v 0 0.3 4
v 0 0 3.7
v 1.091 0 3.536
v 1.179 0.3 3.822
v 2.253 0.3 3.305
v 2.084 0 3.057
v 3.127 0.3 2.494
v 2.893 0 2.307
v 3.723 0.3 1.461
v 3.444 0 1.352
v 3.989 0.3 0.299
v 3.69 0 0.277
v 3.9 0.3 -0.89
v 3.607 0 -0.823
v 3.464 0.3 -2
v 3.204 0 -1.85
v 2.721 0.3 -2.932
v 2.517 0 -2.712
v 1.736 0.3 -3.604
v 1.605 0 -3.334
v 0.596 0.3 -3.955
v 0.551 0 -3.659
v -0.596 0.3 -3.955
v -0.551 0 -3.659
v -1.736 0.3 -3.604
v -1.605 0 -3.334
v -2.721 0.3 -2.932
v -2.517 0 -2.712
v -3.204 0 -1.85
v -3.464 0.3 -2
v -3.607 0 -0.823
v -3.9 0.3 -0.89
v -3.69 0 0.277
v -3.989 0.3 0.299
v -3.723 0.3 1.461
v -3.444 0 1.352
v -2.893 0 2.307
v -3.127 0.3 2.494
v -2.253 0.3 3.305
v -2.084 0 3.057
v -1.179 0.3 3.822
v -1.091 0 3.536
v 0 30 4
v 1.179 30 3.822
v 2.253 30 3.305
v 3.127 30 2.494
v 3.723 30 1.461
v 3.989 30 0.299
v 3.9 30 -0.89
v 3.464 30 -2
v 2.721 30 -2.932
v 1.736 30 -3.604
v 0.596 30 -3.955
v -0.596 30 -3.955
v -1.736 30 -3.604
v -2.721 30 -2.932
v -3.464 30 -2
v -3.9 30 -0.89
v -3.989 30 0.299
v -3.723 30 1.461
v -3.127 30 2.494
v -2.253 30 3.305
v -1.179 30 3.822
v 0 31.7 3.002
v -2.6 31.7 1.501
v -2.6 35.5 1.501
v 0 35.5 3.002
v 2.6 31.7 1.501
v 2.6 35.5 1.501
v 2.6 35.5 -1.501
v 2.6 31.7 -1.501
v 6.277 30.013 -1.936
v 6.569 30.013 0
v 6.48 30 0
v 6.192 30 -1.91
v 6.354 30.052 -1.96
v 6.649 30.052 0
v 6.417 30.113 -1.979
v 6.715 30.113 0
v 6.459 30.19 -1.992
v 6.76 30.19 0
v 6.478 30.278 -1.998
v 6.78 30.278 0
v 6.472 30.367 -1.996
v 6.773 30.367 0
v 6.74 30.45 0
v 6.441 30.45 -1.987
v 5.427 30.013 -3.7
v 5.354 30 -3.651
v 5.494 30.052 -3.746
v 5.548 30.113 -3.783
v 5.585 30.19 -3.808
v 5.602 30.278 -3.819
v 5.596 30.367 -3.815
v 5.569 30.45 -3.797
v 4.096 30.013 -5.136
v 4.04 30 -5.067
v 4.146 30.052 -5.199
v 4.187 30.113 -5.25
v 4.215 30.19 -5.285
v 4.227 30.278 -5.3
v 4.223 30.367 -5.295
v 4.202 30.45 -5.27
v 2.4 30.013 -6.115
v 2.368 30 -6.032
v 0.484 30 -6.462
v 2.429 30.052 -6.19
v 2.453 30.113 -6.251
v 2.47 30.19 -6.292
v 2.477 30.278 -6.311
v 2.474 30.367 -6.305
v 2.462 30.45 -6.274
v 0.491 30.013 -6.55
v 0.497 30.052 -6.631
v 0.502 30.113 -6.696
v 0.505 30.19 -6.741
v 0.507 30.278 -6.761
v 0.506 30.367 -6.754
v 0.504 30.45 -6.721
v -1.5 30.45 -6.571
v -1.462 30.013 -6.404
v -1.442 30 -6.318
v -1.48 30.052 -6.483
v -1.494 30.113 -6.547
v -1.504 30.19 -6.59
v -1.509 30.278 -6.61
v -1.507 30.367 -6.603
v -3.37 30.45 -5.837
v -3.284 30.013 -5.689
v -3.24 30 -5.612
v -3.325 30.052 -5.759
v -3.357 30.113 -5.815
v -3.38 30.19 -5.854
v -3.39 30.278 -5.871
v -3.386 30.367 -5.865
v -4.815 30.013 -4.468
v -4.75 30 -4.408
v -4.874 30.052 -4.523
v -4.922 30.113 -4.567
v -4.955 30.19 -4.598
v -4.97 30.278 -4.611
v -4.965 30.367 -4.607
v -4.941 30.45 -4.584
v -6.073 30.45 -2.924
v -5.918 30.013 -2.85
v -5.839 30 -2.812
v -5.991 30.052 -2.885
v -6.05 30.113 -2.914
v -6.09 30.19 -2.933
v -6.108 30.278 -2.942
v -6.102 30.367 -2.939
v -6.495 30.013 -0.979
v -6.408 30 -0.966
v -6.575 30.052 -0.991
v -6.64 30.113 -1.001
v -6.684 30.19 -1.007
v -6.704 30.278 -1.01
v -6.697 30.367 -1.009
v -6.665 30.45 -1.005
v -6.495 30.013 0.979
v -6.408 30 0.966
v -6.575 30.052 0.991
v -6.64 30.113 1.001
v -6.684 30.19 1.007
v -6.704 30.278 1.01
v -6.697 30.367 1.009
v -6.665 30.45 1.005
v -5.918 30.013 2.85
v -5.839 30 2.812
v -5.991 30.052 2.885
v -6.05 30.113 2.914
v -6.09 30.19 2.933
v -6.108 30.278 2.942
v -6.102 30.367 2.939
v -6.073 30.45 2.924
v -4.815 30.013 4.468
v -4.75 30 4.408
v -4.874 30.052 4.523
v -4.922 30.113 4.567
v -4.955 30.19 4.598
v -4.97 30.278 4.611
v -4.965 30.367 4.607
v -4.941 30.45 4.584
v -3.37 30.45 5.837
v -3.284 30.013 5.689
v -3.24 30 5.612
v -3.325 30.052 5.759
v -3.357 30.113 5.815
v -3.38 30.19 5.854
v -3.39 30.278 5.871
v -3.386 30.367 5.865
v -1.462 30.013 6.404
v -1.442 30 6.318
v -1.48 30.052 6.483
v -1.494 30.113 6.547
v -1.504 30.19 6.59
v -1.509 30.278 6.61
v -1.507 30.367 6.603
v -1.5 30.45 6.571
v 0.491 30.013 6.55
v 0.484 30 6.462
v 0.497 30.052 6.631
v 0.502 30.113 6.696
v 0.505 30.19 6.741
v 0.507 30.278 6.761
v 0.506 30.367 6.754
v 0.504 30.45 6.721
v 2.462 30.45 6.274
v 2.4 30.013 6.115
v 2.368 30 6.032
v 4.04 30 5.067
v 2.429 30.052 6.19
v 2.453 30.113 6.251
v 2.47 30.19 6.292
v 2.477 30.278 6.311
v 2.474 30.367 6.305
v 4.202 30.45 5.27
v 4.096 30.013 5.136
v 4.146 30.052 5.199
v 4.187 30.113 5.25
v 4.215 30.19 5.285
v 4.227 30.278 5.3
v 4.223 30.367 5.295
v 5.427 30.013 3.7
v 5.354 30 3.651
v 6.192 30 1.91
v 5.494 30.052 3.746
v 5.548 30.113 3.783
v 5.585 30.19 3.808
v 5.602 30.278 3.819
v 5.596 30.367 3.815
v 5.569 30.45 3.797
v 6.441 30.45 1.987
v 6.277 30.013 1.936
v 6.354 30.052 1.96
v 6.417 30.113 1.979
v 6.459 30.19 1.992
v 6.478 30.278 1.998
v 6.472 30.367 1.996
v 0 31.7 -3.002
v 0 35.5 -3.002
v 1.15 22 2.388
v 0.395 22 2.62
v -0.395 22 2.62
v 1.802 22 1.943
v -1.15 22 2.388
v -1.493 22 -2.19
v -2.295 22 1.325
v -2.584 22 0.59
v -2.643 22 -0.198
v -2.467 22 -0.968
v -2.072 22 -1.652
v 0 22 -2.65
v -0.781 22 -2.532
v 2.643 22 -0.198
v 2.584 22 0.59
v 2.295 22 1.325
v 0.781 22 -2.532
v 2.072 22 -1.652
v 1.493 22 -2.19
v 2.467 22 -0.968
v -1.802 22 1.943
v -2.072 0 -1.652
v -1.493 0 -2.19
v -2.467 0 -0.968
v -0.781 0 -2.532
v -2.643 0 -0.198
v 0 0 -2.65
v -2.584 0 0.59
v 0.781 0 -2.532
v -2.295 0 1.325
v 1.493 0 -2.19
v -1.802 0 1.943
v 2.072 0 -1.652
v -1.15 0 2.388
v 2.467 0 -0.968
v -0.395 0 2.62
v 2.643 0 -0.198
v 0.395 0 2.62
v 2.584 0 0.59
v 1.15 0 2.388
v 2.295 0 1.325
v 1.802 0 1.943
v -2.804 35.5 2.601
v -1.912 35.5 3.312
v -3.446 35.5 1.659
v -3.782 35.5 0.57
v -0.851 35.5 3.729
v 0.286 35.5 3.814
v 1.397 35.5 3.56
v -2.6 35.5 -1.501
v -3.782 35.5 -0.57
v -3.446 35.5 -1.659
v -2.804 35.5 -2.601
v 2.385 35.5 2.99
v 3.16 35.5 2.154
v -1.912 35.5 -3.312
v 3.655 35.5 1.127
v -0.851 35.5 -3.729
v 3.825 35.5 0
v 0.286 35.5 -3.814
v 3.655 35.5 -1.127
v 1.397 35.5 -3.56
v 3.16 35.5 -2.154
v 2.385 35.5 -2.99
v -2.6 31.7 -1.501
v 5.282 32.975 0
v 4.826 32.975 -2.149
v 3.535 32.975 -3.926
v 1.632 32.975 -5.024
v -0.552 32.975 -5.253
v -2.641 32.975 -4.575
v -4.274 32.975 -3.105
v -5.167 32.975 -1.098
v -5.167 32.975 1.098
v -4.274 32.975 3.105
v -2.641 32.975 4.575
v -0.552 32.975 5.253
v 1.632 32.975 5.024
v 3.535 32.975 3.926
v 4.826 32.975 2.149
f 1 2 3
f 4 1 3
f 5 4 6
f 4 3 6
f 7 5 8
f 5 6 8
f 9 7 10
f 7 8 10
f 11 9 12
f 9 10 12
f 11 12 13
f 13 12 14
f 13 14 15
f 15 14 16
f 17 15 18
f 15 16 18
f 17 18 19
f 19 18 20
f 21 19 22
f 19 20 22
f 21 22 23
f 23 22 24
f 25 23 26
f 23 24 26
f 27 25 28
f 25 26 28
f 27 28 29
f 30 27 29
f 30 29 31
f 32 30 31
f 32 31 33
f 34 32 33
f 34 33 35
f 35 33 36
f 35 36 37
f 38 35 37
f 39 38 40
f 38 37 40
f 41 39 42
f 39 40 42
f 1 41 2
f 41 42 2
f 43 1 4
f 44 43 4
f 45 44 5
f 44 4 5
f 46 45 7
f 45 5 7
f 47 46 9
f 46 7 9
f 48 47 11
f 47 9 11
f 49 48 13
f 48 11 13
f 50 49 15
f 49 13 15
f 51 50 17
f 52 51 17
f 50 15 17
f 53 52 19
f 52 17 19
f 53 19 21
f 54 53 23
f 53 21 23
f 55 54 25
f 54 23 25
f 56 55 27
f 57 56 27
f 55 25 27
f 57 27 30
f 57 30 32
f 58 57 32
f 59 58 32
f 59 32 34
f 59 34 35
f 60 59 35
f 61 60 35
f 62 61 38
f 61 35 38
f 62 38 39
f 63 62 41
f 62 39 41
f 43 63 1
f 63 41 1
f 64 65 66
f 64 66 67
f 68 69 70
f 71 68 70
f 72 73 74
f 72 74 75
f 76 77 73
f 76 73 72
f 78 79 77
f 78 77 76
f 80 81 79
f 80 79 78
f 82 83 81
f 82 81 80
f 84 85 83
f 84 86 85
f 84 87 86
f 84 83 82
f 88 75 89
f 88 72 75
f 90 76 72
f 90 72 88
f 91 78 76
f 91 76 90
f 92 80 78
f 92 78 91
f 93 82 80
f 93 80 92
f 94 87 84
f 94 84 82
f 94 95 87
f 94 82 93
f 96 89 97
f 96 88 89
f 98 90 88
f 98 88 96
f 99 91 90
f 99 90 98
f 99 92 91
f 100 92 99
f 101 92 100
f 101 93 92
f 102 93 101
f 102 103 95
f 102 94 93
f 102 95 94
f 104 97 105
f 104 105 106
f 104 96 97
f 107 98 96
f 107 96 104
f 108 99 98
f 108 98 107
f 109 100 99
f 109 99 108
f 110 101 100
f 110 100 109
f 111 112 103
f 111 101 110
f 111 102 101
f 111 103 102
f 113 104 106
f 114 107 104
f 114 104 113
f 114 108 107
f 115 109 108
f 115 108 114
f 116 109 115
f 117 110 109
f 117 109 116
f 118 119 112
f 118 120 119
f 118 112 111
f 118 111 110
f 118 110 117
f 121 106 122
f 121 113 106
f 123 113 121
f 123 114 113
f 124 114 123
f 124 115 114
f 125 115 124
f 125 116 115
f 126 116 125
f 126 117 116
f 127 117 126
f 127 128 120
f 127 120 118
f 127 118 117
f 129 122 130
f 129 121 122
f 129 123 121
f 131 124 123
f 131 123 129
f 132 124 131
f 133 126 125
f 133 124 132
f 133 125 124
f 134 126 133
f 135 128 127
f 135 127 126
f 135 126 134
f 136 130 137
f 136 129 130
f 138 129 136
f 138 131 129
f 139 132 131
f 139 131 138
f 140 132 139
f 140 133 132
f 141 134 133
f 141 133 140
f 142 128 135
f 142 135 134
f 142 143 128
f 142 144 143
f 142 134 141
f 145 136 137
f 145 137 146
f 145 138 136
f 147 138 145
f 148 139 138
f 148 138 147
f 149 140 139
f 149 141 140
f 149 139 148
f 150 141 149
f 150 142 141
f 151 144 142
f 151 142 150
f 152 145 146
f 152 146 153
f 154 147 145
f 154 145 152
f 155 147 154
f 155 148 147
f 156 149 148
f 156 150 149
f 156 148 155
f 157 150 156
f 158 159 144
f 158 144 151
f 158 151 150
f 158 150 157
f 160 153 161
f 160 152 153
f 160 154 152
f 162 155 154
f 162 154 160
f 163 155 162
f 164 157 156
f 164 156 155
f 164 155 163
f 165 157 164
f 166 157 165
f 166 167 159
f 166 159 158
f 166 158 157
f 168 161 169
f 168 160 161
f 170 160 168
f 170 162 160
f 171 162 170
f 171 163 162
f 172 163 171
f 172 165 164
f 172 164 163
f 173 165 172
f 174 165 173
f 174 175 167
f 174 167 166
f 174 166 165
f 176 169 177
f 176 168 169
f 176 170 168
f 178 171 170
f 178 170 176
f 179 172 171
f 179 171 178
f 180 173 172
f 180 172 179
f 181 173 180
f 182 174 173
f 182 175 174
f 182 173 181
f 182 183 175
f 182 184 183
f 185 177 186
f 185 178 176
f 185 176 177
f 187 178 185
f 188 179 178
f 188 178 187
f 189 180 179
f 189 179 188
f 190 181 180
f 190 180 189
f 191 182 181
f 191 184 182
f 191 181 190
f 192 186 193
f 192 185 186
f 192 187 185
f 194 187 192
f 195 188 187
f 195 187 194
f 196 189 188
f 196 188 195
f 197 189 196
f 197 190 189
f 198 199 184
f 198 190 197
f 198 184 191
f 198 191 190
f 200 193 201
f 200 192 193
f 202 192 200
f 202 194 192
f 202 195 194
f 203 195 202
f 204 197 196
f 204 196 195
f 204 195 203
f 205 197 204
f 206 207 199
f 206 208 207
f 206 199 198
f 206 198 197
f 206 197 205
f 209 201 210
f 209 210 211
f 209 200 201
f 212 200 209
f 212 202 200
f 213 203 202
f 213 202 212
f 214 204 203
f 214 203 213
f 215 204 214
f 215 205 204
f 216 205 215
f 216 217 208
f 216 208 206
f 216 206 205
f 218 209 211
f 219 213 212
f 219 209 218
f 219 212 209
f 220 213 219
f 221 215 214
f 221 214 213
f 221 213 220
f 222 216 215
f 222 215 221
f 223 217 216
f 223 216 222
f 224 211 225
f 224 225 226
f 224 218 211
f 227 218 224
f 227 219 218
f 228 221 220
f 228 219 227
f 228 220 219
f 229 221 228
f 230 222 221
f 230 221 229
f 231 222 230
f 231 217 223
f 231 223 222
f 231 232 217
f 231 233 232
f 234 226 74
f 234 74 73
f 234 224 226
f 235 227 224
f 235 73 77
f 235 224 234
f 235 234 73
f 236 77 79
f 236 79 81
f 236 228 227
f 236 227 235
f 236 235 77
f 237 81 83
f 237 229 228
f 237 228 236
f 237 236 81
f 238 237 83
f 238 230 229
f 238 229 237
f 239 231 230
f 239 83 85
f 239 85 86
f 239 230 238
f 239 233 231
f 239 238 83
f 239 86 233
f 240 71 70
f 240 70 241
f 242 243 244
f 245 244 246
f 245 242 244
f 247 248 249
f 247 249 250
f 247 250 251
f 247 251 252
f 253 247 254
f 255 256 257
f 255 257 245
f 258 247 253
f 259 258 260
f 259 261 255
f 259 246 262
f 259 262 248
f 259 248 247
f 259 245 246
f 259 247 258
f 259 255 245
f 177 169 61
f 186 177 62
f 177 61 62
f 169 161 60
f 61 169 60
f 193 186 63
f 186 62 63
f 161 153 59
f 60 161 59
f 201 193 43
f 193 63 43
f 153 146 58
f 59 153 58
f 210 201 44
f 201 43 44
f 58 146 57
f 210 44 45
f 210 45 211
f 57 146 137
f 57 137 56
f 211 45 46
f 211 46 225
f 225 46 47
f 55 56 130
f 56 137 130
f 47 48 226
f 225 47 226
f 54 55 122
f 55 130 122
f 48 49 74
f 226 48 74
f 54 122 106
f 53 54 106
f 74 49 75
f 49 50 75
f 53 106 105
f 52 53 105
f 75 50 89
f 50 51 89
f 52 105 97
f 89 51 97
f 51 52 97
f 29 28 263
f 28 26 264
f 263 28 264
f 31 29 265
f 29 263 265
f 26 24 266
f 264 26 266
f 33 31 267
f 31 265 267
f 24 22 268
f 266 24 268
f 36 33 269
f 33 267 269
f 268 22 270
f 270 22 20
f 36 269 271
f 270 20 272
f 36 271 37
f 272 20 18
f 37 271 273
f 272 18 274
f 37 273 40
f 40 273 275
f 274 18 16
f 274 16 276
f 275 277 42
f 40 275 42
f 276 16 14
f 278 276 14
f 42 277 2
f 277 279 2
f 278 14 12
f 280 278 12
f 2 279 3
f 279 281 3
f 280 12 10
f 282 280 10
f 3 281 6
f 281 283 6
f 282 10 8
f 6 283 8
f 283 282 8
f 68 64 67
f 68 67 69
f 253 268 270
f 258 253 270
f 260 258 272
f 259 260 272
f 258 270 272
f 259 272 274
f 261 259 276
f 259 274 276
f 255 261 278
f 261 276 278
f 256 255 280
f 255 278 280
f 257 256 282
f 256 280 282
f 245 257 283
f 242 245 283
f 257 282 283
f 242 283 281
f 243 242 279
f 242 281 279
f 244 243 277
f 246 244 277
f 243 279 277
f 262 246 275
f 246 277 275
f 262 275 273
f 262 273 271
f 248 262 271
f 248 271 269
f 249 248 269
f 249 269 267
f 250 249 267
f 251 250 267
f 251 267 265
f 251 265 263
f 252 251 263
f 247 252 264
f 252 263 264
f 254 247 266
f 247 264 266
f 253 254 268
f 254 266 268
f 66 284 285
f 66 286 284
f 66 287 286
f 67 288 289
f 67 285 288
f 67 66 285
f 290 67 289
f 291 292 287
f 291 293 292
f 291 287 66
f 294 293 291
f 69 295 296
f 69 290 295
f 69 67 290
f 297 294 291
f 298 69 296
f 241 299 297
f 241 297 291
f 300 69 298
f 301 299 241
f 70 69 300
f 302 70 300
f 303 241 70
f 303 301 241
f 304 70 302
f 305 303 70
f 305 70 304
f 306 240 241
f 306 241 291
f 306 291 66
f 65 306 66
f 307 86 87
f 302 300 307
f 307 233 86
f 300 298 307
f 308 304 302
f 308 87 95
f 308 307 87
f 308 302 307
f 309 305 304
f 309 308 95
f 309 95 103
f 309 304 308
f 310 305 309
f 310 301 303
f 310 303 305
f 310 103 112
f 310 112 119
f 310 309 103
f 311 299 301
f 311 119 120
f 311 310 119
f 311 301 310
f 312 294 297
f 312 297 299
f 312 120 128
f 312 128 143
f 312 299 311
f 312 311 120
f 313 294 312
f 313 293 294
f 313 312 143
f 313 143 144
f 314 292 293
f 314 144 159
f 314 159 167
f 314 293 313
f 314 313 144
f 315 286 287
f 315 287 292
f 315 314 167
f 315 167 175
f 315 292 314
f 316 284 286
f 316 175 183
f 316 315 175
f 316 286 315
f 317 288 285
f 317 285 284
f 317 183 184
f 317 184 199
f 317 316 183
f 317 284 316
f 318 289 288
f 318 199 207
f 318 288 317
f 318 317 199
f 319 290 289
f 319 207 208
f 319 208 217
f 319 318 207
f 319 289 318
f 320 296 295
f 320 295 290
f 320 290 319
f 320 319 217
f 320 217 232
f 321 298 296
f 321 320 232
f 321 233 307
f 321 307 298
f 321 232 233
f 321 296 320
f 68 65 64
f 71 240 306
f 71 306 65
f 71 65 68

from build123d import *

# Parameters (mm, degrees)
SKETCH1_R           = 4
BOSS_EXTRUDE1_DEPTH = 30
SKETCH2_R           = 7
BOSS_EXTRUDE2_DEPTH = 5.5
BOSS_EXTRUDE2_TAPER = 30
CUT_EXTRUDE1_DEPTH  = 3.8
SKETCH4_R           = 2.65
CUT_EXTRUDE2_DEPTH  = 22
CHAMFER1_SIZE       = 0.3
FILLET1_R           = 0.3


with BuildPart() as part:
    # Sketch1 → Boss-Extrude1 (new body)
    with BuildSketch(Plane(origin=(0, 0, 0), x_dir=(1, 0, 0), z_dir=(0, 1, 0))):
        with Locations(Location((0, 0, 0), (0, 0, 270))):
            Circle(SKETCH1_R)
    extrude(amount=BOSS_EXTRUDE1_DEPTH)

    # Sketch2 → Boss-Extrude2 (add)
    with BuildSketch(Plane(origin=(0, 30, 0), x_dir=(1, 0, 0), z_dir=(0, 1, 0))):
        Circle(SKETCH2_R)
    extrude(amount=BOSS_EXTRUDE2_DEPTH, taper=BOSS_EXTRUDE2_TAPER)

    # Sketch3 → Cut-Extrude1 (cut)
    with BuildSketch(Plane(origin=(0, 35.5, 0), x_dir=(1, 0, 0), z_dir=(0, 1, 0))):
        Polygon((0, 3.0022214), (-2.6, 1.5011107), (-2.6, -1.5011107), (0, -3.0022214), (2.6, -1.5011107), (2.6, 1.5011107), align=None)
    extrude(amount=-CUT_EXTRUDE1_DEPTH, mode=Mode.SUBTRACT)

    # Sketch4 → Cut-Extrude2 (cut)
    with BuildSketch(Plane.XZ):
        with Locations(Location((0, 0, 0), (0, 0, 270))):
            Circle(SKETCH4_R)
    extrude(amount=-CUT_EXTRUDE2_DEPTH, mode=Mode.SUBTRACT)

    # Chamfer1
    chamfer1_edges = [part.edges().sort_by_distance(p)[0] for p in [
        (0, 0, -4),
    ]]
    chamfer(chamfer1_edges, length=CHAMFER1_SIZE)

    # Fillet1
    fillet1_edges = [part.edges().sort_by_distance(p)[0] for p in [
        (-7, 30, 0),
    ]]
    fillet(fillet1_edges, radius=FILLET1_R)


solid = part.part
